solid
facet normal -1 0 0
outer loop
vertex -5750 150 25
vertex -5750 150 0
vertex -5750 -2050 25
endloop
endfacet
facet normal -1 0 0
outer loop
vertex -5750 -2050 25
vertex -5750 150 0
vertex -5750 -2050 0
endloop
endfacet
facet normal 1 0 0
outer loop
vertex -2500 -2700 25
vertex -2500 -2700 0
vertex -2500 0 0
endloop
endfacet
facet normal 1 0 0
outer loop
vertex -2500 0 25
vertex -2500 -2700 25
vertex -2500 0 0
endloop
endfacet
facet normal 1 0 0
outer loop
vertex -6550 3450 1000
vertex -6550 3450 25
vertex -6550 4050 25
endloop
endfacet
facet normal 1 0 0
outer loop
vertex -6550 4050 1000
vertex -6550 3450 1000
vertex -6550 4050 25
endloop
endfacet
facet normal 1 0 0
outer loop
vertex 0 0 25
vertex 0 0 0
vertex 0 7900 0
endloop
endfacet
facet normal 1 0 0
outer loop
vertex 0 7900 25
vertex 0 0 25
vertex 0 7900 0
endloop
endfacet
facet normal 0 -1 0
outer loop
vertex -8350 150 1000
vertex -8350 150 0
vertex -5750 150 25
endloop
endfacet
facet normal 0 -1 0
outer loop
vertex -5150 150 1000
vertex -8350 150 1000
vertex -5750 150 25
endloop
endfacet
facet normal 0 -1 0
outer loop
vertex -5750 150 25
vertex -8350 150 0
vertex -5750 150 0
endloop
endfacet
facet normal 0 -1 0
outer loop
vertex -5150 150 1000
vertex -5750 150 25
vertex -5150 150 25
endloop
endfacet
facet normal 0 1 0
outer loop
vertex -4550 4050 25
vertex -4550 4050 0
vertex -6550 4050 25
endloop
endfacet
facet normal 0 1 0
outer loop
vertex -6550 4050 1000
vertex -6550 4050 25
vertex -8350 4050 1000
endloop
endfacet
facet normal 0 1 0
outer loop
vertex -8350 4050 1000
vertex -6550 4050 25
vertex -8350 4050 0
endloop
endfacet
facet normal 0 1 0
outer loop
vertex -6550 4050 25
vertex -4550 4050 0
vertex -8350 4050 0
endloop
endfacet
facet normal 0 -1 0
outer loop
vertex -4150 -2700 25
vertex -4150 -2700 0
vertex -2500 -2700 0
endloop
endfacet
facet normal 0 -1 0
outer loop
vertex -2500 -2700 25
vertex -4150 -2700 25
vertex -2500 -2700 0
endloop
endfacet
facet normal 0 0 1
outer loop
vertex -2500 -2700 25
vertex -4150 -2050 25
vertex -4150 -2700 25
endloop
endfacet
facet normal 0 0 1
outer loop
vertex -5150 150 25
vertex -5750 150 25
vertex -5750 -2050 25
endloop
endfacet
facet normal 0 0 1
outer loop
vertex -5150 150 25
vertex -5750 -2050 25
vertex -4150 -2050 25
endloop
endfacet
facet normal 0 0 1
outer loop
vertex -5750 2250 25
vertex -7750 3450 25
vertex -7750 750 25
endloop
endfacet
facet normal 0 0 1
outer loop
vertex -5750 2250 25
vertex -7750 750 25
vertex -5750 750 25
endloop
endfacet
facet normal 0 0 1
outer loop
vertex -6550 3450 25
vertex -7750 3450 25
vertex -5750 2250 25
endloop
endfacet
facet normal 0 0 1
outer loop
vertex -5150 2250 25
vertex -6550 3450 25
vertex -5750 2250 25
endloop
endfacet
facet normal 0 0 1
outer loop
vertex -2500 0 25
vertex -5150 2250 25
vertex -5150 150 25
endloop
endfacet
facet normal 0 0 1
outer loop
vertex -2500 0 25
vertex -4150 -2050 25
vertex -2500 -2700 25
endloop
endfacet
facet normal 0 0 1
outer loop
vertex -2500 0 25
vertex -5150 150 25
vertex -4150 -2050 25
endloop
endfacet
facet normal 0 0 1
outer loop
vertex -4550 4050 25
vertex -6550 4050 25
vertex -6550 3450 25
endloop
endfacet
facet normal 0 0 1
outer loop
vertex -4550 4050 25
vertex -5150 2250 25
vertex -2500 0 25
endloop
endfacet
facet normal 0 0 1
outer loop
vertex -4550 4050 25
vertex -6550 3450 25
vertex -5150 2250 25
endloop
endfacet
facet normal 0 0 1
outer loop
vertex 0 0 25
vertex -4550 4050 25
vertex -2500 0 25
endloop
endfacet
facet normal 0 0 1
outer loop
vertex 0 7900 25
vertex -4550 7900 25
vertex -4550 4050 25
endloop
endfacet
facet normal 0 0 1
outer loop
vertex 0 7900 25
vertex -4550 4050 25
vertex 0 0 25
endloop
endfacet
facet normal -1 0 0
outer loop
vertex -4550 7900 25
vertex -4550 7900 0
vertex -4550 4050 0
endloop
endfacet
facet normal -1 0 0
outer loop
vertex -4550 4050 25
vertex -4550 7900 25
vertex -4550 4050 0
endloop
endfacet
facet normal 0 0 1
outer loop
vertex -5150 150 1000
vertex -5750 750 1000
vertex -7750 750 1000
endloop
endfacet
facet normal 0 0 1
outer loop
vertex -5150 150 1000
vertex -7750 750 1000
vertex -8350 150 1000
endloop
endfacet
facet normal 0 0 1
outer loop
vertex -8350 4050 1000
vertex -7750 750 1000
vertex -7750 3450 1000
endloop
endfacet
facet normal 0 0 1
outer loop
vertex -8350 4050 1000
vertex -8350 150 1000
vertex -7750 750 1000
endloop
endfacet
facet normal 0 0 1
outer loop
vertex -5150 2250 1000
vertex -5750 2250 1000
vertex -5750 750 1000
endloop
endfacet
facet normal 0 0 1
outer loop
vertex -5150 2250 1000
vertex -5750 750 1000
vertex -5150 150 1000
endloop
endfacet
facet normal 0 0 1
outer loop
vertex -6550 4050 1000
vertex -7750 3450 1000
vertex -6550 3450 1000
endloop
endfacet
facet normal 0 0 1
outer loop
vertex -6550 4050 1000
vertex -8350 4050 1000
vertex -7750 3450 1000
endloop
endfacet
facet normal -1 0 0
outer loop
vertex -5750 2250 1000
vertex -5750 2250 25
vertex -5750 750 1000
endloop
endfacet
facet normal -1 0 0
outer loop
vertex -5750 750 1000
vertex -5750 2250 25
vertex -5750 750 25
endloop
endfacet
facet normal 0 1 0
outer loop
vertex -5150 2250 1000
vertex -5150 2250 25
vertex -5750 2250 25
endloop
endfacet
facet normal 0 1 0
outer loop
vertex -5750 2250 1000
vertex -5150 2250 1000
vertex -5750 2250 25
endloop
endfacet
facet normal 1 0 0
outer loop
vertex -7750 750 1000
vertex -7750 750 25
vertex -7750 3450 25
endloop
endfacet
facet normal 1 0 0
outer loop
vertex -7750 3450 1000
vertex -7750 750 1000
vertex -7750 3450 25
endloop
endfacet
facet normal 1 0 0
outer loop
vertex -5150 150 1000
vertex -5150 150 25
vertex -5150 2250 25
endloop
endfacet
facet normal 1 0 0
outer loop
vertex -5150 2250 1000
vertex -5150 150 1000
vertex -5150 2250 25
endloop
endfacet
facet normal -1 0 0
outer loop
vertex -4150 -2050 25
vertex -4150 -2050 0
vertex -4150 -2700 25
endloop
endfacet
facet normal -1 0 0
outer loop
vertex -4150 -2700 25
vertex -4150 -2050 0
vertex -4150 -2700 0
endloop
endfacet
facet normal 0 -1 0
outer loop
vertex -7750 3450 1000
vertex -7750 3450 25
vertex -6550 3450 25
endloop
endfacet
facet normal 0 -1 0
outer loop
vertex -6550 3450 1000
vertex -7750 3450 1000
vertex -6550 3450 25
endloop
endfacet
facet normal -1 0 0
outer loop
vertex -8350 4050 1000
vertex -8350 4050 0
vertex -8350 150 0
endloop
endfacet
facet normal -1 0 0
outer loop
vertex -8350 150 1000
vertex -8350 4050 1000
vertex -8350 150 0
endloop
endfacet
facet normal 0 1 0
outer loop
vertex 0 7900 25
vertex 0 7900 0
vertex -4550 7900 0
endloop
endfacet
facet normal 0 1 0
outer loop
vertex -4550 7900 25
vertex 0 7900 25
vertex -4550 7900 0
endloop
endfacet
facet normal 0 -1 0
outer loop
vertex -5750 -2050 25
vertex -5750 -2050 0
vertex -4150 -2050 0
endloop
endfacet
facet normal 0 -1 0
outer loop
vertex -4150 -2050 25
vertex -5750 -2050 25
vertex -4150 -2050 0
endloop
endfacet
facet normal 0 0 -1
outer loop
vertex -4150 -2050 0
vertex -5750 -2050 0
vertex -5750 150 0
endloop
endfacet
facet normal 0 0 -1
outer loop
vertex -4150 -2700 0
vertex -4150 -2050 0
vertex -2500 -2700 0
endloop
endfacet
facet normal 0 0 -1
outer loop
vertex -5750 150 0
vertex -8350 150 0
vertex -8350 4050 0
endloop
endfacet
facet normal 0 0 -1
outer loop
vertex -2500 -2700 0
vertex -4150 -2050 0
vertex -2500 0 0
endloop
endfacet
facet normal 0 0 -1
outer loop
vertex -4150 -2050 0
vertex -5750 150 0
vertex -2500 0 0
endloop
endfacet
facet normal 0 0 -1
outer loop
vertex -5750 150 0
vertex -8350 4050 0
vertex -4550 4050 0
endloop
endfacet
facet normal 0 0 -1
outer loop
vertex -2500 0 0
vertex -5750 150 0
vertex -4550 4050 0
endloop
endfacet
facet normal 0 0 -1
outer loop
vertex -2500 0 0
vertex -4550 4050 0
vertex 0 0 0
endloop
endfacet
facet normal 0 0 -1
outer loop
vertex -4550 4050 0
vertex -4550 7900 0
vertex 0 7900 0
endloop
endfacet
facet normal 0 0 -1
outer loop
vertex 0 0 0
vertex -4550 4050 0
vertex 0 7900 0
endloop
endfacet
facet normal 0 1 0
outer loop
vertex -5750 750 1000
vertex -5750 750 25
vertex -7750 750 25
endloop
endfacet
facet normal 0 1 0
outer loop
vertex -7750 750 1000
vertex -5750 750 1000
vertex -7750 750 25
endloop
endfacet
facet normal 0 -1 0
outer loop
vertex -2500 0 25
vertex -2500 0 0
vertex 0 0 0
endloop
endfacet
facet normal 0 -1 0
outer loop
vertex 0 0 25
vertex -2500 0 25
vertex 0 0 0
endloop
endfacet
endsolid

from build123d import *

# Parameters (mm, degrees)
F2_DEPTH = 25
F3_DEPTH = 1000


with BuildPart() as f2:
    # F1 (on face) → F2 (new body)
    with BuildSketch(Plane.XY):
        Polygon((-4550, 7900), (-4550, 4050), (-6550, 4050), (-6550, 3450), (-7750, 3450), (-7750, 750), (-5750, 750), (-5750, 2250), (-5150, 2250), (-5150, 150), (-5750, 150), (-5750, -2050), (-4150, -2050), (-4150, -2700), (-2500, -2700), (-2500, 0), (0, 0), (0, 7900), align=None)
    extrude(amount=F2_DEPTH)

    # F1 (on face) → F3 (join)
    with BuildSketch(Plane.XY):
        Polygon((-6550, 3450), (-6550, 4050), (-8350, 4050), (-8350, 150), (-5750, 150), (-5150, 150), (-5150, 2250), (-5750, 2250), (-5750, 750), (-7750, 750), (-7750, 3450), align=None)
    extrude(amount=F3_DEPTH)


solid = f2.part
